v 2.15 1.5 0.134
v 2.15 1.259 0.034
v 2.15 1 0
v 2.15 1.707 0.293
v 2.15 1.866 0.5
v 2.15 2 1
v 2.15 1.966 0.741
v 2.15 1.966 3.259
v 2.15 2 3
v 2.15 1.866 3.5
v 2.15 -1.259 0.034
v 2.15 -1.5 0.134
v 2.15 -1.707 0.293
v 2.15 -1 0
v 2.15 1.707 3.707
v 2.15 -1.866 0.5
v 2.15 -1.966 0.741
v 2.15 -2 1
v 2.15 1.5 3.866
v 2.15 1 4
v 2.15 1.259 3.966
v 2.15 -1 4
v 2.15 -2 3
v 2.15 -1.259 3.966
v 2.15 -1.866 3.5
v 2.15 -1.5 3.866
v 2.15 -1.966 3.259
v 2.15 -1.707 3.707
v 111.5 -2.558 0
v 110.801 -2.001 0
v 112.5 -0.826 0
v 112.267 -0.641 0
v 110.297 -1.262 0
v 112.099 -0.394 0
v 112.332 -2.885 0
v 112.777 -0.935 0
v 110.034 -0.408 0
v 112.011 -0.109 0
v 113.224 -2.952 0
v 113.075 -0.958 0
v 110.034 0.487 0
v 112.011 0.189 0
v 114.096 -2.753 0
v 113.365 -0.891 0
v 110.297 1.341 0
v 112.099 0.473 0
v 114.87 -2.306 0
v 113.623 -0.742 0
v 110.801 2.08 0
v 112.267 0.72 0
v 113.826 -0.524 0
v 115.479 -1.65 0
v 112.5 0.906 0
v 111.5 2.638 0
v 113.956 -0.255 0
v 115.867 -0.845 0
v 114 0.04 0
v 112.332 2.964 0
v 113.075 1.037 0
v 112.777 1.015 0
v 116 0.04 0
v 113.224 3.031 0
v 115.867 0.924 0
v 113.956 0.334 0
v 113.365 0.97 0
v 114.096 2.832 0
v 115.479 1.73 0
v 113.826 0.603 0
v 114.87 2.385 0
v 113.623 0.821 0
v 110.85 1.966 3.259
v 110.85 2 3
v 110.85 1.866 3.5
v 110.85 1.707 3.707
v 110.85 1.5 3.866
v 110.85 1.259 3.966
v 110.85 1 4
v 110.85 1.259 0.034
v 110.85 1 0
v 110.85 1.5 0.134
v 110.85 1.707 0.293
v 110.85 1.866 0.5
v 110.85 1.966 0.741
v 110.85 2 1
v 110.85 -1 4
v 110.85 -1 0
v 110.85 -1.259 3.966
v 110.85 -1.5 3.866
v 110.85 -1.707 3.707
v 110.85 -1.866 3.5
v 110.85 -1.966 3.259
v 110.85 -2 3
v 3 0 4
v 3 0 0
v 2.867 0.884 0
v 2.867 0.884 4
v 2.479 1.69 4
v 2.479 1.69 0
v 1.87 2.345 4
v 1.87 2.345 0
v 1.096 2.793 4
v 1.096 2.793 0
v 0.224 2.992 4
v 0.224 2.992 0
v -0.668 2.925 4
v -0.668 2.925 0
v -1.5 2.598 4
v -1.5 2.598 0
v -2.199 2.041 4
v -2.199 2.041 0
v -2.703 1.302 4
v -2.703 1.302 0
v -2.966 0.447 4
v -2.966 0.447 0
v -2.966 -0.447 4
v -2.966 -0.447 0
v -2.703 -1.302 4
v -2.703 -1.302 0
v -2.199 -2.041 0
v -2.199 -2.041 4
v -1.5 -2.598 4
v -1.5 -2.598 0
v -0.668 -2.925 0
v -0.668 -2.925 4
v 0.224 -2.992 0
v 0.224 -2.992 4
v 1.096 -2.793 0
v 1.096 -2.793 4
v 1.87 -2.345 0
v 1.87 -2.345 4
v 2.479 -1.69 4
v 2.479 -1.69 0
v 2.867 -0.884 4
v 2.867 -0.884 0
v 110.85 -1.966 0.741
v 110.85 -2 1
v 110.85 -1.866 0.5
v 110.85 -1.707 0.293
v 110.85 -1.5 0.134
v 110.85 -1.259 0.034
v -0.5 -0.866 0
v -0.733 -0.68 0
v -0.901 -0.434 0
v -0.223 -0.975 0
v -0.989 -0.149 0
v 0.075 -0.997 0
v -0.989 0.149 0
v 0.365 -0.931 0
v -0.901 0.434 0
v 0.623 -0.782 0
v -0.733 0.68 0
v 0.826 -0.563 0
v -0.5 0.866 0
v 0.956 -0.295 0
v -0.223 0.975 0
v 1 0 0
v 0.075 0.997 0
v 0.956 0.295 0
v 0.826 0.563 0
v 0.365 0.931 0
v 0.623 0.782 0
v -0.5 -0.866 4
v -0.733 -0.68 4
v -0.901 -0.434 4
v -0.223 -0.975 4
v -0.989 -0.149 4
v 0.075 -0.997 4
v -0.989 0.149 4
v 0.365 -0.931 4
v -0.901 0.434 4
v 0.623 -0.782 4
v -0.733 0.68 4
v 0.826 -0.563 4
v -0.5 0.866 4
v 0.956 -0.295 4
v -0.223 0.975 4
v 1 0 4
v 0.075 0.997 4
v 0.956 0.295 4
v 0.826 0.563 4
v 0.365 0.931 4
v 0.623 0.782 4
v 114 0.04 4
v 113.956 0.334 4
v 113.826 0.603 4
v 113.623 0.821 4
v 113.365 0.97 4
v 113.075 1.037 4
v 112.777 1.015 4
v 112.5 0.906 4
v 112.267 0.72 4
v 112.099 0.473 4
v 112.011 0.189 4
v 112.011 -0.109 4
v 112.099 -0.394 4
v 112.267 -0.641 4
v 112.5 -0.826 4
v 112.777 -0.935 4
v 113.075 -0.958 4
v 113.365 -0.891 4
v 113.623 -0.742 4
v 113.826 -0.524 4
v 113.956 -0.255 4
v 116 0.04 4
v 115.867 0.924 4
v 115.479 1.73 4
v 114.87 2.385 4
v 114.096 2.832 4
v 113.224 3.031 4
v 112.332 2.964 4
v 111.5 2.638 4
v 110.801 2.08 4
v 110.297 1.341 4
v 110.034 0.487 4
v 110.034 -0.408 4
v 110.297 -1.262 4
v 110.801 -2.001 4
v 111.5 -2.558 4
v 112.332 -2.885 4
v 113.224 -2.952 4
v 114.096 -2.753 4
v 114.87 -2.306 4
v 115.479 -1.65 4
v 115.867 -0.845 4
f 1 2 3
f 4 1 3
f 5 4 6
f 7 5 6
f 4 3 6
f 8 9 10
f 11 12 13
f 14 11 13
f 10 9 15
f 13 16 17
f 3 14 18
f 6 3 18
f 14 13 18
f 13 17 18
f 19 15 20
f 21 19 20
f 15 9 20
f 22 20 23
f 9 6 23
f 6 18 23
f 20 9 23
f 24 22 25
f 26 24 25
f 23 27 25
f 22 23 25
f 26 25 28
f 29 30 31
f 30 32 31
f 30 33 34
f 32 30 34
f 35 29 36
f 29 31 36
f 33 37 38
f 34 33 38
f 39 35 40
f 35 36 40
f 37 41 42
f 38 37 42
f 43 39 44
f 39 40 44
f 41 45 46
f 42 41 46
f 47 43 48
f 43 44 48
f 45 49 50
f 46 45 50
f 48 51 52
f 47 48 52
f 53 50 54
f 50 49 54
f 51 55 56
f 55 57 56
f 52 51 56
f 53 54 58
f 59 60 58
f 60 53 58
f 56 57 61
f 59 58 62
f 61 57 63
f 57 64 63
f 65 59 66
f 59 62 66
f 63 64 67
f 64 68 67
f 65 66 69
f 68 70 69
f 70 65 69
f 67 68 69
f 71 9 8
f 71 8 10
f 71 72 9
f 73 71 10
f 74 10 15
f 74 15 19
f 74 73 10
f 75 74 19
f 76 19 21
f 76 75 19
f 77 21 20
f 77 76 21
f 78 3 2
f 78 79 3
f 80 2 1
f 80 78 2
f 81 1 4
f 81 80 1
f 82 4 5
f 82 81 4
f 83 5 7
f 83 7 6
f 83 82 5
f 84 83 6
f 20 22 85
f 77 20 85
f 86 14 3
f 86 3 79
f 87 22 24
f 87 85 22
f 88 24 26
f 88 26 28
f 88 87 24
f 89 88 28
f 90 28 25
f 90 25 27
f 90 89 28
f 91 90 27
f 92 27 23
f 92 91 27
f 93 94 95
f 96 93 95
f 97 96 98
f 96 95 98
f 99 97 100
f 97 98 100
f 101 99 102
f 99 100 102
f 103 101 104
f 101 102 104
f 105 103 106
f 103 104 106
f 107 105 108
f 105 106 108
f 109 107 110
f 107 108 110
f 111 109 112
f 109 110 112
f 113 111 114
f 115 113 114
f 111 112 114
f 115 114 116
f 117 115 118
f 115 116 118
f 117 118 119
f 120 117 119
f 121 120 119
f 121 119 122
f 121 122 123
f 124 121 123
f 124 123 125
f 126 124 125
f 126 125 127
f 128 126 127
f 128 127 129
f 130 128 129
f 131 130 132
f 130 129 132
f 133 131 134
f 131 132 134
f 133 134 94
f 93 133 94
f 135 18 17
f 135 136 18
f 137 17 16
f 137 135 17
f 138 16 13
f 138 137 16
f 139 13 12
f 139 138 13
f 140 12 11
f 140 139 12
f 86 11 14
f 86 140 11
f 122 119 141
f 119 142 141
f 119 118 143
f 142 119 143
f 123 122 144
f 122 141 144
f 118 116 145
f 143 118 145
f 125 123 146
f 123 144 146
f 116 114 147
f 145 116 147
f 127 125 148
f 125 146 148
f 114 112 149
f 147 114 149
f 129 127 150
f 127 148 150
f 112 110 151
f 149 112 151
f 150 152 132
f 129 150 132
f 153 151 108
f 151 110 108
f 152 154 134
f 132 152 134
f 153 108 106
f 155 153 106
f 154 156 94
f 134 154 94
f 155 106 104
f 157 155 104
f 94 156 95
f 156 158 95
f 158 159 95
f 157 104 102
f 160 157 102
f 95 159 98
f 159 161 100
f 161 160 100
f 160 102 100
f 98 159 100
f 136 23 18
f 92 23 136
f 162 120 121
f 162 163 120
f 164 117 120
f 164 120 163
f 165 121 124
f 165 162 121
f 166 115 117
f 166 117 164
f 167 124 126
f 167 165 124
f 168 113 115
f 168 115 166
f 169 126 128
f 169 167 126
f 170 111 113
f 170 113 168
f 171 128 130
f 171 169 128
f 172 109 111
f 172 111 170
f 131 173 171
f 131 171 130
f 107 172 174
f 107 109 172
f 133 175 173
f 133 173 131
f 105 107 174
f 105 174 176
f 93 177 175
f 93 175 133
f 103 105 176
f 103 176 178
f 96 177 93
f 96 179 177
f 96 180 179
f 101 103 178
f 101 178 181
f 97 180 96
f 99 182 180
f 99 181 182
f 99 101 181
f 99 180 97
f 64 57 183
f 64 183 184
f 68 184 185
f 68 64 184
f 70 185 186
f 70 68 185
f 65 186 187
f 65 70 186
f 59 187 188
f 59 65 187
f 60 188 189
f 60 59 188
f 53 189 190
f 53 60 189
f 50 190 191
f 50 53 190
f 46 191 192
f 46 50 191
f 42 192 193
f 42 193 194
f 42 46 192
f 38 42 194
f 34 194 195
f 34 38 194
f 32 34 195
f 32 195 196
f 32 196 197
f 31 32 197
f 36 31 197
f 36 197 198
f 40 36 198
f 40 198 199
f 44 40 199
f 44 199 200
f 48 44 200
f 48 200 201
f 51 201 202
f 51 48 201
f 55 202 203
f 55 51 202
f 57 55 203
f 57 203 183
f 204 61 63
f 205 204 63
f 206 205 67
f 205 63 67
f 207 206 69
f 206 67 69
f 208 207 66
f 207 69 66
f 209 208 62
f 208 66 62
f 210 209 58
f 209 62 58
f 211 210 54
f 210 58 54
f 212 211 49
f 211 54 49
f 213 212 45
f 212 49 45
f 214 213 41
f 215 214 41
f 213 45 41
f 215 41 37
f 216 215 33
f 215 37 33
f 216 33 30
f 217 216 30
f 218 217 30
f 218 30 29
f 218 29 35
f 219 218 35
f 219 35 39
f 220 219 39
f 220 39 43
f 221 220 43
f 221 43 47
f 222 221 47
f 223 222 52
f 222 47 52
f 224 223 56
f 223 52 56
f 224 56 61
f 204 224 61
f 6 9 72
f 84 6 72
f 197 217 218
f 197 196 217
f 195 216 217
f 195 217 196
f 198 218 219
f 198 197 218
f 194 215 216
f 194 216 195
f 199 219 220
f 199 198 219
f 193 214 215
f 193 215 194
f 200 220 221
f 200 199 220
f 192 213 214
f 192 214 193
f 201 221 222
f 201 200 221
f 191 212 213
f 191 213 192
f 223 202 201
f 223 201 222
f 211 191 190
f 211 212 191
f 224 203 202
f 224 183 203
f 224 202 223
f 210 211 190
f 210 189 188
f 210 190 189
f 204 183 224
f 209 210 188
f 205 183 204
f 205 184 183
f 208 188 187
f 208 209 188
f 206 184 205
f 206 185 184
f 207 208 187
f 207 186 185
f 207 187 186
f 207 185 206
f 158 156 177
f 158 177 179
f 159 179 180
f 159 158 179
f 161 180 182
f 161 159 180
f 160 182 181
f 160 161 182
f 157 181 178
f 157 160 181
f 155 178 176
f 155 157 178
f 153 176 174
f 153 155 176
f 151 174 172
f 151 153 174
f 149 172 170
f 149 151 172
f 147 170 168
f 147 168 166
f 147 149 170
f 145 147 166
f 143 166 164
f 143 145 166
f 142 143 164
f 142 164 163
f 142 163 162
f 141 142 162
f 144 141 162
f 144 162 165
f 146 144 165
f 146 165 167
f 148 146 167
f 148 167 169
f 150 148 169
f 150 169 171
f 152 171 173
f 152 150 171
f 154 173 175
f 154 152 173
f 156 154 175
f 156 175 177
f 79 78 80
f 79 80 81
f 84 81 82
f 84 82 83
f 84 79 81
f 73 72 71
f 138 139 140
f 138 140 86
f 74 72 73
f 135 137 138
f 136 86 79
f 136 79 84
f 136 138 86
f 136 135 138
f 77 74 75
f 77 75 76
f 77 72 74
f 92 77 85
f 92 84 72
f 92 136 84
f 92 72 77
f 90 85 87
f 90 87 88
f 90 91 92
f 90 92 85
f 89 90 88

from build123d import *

# Parameters (mm, degrees)
SKETCH_R     = 3
SKETCH_R_2   = 1
PAD_DEPTH    = 4
SKETCH001_W  = 108.7
SKETCH001_H  = 4
PAD001_DEPTH = 2
FILLET_R     = 1
FILLET001_R  = 1
FILLET002_R  = 1
FILLET003_R  = 1


with BuildPart() as pad:
    # Sketch → Pad (new body)
    with BuildSketch(Plane.XY):
        Circle(SKETCH_R)
        Circle(SKETCH_R_2, mode=Mode.SUBTRACT)
        with Locations((113, 0.039615)):
            Circle(SKETCH_R)
        with Locations((113, 0.039615)):
            Circle(SKETCH_R_2, mode=Mode.SUBTRACT)
    extrude(amount=PAD_DEPTH)


with BuildPart() as fillet003:
    # Sketch001 → Pad001 (new body, symmetric)
    with BuildSketch(Plane.XZ):
        with Locations((56.5, 2)):
            Rectangle(SKETCH001_W, SKETCH001_H)
    extrude(amount=PAD001_DEPTH, both=True)

    # Fillet
    fillet_edges = [fillet003.edges().sort_by_distance(p)[0] for p in [
        (56.5, -2, 0),
    ]]
    fillet(fillet_edges, radius=FILLET_R)

    # Fillet001
    fillet001_edges = [fillet003.edges().sort_by_distance(p)[0] for p in [
        (56.5, 2, 0),
    ]]
    fillet(fillet001_edges, radius=FILLET001_R)

    # Fillet002
    fillet002_edges = [fillet003.edges().sort_by_distance(p)[0] for p in [
        (56.5, 2, 4),
    ]]
    fillet(fillet002_edges, radius=FILLET002_R)

    # Fillet003
    fillet003_edges = [fillet003.edges().sort_by_distance(p)[0] for p in [
        (56.5, -2, 4),
    ]]
    fillet(fillet003_edges, radius=FILLET003_R)


solid = Compound([pad.part, fillet003.part])
